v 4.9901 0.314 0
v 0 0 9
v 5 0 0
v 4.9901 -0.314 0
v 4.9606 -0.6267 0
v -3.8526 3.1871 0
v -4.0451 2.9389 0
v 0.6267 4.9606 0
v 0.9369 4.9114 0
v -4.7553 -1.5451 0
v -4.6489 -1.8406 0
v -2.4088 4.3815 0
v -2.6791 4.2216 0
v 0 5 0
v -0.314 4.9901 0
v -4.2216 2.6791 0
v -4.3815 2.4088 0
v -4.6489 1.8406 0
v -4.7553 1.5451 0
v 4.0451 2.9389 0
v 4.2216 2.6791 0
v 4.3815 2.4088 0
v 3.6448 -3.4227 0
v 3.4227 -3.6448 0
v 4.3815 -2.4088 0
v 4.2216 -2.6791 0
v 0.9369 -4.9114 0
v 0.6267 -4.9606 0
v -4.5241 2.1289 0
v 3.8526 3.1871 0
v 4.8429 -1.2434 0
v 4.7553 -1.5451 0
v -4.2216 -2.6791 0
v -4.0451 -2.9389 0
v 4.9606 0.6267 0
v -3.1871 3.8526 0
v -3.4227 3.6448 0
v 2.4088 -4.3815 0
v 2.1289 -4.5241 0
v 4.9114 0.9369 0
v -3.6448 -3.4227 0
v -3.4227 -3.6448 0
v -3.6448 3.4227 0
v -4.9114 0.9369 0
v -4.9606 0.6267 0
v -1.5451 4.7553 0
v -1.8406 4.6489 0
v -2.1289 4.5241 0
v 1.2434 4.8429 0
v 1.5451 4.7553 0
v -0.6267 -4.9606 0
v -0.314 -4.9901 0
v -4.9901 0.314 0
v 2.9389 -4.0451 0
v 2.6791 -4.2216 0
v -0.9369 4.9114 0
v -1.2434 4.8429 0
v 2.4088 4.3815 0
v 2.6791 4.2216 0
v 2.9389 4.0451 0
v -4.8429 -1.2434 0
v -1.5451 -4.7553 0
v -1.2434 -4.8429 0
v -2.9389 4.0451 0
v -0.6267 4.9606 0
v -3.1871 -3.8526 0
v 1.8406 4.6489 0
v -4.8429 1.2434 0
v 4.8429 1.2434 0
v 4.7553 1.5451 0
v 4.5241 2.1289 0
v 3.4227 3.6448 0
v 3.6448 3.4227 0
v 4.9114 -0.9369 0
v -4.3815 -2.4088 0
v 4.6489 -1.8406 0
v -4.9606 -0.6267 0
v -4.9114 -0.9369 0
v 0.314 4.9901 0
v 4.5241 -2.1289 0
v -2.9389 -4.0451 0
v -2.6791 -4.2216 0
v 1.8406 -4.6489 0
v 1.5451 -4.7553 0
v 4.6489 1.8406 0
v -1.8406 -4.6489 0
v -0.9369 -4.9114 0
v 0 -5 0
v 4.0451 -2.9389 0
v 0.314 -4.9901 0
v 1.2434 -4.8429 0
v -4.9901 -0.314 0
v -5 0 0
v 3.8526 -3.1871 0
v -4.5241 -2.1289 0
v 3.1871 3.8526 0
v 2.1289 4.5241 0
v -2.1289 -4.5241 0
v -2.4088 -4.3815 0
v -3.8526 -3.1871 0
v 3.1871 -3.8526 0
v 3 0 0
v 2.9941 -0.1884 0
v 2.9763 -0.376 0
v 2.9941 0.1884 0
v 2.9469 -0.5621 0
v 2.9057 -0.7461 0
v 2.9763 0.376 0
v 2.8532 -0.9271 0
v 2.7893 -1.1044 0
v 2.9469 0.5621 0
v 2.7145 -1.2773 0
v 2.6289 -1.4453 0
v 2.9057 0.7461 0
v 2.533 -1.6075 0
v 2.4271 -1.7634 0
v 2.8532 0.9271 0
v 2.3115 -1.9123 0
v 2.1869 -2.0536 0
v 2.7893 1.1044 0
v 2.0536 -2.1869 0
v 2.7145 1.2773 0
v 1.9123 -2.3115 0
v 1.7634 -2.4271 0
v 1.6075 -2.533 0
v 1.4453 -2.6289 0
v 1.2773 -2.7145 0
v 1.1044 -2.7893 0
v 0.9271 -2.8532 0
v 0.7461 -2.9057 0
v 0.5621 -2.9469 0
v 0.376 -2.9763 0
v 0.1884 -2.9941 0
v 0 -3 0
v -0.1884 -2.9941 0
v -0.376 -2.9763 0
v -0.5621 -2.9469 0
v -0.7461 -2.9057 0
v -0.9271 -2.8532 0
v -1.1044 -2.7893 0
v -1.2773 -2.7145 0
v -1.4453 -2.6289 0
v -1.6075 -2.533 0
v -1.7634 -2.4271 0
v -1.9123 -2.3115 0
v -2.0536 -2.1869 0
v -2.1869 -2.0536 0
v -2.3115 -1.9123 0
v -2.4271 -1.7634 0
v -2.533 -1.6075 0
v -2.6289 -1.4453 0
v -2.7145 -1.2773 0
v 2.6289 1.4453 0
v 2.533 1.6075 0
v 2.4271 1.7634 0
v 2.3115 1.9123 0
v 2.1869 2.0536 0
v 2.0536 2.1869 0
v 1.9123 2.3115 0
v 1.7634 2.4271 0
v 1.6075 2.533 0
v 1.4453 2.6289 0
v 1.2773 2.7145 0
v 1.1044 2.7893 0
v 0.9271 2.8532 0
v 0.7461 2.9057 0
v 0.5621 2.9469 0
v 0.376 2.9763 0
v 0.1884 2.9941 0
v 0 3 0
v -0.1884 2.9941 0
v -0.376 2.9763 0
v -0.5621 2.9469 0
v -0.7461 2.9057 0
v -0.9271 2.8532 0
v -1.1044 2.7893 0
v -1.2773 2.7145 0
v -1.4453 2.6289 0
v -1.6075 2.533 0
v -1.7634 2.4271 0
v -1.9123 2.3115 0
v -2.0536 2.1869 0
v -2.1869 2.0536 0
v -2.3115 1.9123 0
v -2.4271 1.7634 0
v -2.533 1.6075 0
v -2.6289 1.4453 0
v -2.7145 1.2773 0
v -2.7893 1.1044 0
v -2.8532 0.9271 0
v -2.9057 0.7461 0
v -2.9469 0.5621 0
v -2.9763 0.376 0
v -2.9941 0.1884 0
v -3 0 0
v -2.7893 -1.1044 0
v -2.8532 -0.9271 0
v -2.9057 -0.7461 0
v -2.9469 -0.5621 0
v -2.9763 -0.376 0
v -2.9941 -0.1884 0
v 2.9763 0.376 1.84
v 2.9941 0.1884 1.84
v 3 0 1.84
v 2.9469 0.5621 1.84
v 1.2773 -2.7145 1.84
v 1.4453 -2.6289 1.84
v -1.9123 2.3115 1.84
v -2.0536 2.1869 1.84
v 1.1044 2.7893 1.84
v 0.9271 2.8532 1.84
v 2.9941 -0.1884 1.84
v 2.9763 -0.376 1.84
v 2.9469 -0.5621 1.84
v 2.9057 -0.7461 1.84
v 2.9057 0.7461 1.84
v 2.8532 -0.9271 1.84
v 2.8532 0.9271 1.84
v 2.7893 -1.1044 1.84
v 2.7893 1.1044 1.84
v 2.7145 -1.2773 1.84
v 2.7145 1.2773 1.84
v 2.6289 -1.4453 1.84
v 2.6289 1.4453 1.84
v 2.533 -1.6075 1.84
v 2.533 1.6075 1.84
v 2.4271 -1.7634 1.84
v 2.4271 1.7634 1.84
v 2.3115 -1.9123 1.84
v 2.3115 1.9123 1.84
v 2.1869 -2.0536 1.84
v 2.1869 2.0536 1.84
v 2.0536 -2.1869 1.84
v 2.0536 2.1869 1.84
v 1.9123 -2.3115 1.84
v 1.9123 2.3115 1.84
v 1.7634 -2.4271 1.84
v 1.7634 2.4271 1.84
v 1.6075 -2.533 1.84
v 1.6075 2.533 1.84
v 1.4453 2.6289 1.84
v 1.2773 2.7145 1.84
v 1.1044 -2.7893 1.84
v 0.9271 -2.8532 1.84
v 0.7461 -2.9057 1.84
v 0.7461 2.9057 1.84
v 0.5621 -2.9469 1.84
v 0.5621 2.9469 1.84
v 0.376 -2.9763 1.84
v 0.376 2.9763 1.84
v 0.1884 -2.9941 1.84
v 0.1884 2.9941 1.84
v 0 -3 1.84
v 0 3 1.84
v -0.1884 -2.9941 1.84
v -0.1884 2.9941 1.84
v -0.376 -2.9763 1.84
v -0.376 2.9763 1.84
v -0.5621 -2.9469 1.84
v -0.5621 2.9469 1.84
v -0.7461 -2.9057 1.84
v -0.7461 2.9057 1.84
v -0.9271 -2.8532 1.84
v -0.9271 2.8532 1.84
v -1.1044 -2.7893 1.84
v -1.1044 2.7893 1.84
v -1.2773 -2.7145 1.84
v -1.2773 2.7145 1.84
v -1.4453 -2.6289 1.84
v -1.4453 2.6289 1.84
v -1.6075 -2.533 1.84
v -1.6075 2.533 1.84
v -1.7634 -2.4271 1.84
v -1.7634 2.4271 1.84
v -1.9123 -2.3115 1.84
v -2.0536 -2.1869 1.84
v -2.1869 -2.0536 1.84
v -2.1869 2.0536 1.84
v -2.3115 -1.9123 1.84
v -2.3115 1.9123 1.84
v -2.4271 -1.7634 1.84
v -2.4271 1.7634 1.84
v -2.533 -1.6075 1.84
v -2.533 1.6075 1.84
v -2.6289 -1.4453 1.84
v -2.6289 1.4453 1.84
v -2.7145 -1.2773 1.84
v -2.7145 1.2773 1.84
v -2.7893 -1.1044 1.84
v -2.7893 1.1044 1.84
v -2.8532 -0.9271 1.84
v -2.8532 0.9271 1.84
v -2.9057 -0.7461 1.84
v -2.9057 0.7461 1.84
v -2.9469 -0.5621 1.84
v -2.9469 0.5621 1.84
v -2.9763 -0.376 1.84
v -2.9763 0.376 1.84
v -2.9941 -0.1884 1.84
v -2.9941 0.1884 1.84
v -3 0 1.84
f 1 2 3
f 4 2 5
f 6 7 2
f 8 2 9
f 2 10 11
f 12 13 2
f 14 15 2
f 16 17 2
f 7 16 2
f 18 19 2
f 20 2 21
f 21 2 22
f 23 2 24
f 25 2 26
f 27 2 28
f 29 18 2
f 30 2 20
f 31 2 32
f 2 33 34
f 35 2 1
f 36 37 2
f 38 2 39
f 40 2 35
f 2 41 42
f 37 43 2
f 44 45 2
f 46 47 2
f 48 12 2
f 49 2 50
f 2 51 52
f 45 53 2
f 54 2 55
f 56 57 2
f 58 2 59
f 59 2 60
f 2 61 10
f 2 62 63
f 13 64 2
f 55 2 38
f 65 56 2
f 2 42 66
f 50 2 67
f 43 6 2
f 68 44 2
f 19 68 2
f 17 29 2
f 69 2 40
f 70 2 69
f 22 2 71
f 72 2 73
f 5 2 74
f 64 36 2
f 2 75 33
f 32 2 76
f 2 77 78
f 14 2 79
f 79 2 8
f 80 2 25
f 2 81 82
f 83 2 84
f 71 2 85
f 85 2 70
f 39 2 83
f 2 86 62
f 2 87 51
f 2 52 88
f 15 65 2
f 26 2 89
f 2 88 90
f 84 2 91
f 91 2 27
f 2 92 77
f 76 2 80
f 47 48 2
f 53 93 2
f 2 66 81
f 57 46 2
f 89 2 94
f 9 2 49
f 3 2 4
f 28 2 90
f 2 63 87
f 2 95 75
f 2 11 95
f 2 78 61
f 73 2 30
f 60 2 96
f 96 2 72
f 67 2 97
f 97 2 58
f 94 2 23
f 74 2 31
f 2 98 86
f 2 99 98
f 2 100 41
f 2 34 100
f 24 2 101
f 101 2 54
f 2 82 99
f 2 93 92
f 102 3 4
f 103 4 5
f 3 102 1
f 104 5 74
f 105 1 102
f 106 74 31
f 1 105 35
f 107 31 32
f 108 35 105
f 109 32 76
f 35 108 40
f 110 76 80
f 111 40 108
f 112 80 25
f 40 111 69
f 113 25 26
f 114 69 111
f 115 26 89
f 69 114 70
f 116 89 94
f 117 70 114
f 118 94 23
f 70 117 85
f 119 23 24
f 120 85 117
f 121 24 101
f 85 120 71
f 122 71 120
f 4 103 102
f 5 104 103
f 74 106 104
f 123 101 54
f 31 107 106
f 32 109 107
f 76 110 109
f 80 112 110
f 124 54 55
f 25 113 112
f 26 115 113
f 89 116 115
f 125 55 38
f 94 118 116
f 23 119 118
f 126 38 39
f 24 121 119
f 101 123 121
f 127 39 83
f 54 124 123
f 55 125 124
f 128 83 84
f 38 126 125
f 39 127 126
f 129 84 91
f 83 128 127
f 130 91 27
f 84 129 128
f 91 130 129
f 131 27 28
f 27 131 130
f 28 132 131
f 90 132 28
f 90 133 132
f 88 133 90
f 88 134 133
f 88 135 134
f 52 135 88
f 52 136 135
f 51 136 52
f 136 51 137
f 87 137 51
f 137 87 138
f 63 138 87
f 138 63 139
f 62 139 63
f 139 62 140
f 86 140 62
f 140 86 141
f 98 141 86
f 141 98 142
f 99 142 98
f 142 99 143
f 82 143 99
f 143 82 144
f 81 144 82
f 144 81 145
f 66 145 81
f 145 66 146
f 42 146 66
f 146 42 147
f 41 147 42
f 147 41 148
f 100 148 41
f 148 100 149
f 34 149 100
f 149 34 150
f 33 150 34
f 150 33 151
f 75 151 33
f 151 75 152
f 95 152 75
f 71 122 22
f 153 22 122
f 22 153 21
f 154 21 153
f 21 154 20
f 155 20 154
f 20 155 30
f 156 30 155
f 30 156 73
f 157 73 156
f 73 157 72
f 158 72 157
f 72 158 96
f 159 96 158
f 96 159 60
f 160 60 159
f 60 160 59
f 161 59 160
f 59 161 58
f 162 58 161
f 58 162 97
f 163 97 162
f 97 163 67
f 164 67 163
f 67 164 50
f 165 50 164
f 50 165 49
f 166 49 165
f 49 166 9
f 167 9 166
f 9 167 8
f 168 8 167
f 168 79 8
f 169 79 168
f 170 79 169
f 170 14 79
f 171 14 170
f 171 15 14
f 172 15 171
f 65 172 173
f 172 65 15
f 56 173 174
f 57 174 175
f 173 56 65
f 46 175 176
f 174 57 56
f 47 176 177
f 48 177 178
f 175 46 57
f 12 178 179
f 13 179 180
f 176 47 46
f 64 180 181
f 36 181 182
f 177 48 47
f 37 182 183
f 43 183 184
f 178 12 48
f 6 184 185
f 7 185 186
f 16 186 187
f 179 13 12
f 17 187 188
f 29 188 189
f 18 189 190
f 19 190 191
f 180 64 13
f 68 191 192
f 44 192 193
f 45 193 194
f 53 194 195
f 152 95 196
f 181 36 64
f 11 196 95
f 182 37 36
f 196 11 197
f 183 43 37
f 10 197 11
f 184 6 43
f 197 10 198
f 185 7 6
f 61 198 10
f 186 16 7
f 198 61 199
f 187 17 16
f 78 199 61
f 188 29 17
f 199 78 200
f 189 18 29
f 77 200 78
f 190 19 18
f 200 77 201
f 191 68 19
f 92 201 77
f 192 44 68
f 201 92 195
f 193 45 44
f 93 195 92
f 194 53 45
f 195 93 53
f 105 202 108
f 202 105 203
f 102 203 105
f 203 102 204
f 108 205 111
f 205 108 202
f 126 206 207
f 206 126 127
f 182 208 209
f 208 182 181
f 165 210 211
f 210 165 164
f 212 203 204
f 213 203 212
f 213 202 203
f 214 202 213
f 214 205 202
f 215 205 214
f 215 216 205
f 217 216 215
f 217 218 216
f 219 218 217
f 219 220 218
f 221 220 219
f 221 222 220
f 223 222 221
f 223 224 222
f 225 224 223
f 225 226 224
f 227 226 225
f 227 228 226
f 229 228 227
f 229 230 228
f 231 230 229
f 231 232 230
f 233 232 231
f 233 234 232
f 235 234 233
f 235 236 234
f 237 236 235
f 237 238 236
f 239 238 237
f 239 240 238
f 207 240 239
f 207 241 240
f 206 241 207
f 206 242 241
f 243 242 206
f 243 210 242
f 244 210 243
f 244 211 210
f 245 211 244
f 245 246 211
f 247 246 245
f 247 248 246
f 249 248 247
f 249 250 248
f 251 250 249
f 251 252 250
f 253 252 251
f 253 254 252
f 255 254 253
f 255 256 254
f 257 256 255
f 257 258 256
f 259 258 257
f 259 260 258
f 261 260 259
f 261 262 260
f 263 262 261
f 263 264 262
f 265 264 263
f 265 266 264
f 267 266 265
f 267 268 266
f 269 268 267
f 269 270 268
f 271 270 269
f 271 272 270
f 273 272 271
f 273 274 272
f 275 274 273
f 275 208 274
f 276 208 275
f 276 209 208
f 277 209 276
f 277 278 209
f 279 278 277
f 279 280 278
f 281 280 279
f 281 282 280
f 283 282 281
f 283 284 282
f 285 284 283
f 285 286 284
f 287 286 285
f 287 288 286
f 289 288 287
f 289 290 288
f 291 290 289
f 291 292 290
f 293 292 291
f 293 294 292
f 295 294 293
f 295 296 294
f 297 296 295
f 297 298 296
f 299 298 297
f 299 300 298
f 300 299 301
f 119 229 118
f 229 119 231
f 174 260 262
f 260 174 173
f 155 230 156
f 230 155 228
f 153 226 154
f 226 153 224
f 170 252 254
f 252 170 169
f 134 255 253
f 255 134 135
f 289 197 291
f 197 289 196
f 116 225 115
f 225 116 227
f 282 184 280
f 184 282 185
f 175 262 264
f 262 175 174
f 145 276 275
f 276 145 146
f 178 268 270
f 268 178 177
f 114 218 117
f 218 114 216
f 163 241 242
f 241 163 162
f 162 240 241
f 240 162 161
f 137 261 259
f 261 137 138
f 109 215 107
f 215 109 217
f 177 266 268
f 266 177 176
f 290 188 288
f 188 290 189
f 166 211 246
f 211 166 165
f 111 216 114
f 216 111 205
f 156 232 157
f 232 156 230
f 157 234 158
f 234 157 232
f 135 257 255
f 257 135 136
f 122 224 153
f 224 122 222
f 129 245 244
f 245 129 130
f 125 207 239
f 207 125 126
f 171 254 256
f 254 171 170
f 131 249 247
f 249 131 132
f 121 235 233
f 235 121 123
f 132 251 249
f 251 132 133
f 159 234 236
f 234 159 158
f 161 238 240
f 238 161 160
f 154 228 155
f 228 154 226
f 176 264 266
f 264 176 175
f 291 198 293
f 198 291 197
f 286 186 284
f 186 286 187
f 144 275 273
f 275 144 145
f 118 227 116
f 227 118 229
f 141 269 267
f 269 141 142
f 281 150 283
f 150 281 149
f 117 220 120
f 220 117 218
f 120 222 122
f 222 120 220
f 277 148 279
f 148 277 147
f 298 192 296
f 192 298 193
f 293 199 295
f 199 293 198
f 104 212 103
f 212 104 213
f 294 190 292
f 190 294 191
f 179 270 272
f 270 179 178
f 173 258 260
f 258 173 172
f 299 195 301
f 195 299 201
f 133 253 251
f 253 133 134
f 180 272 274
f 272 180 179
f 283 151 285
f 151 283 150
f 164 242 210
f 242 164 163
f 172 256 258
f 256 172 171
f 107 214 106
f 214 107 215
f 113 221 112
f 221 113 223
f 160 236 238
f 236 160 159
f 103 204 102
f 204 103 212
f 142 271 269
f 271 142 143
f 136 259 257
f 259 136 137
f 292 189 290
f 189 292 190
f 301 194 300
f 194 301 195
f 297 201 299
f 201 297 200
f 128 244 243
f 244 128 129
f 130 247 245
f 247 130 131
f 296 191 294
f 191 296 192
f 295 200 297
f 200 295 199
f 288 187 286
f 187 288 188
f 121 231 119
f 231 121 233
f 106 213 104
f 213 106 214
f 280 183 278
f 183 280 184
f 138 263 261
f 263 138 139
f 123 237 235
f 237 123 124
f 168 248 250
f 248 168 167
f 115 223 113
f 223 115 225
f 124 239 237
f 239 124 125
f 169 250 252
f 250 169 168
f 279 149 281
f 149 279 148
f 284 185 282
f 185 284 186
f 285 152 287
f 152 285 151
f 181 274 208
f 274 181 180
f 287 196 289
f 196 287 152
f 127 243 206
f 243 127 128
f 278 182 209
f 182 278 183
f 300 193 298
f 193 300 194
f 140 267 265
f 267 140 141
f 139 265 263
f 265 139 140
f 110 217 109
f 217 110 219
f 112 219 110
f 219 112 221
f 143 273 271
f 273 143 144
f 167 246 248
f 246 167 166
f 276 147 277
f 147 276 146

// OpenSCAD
$fn=100;

tol = 1;
mag_width = 5+tol;
mag_height = 2.68+tol;
wt = 1; // wall thickness
pill_radius = mag_width/2+wt;

bottom_width = 10;
height = 9;
ring_width=1.5;

difference() {
    cylinder(h=height, r1=bottom_width/2, r2=0);
    translate([0,0,-1]) cylinder(h=mag_height/2+1, r=mag_width/2);
}
